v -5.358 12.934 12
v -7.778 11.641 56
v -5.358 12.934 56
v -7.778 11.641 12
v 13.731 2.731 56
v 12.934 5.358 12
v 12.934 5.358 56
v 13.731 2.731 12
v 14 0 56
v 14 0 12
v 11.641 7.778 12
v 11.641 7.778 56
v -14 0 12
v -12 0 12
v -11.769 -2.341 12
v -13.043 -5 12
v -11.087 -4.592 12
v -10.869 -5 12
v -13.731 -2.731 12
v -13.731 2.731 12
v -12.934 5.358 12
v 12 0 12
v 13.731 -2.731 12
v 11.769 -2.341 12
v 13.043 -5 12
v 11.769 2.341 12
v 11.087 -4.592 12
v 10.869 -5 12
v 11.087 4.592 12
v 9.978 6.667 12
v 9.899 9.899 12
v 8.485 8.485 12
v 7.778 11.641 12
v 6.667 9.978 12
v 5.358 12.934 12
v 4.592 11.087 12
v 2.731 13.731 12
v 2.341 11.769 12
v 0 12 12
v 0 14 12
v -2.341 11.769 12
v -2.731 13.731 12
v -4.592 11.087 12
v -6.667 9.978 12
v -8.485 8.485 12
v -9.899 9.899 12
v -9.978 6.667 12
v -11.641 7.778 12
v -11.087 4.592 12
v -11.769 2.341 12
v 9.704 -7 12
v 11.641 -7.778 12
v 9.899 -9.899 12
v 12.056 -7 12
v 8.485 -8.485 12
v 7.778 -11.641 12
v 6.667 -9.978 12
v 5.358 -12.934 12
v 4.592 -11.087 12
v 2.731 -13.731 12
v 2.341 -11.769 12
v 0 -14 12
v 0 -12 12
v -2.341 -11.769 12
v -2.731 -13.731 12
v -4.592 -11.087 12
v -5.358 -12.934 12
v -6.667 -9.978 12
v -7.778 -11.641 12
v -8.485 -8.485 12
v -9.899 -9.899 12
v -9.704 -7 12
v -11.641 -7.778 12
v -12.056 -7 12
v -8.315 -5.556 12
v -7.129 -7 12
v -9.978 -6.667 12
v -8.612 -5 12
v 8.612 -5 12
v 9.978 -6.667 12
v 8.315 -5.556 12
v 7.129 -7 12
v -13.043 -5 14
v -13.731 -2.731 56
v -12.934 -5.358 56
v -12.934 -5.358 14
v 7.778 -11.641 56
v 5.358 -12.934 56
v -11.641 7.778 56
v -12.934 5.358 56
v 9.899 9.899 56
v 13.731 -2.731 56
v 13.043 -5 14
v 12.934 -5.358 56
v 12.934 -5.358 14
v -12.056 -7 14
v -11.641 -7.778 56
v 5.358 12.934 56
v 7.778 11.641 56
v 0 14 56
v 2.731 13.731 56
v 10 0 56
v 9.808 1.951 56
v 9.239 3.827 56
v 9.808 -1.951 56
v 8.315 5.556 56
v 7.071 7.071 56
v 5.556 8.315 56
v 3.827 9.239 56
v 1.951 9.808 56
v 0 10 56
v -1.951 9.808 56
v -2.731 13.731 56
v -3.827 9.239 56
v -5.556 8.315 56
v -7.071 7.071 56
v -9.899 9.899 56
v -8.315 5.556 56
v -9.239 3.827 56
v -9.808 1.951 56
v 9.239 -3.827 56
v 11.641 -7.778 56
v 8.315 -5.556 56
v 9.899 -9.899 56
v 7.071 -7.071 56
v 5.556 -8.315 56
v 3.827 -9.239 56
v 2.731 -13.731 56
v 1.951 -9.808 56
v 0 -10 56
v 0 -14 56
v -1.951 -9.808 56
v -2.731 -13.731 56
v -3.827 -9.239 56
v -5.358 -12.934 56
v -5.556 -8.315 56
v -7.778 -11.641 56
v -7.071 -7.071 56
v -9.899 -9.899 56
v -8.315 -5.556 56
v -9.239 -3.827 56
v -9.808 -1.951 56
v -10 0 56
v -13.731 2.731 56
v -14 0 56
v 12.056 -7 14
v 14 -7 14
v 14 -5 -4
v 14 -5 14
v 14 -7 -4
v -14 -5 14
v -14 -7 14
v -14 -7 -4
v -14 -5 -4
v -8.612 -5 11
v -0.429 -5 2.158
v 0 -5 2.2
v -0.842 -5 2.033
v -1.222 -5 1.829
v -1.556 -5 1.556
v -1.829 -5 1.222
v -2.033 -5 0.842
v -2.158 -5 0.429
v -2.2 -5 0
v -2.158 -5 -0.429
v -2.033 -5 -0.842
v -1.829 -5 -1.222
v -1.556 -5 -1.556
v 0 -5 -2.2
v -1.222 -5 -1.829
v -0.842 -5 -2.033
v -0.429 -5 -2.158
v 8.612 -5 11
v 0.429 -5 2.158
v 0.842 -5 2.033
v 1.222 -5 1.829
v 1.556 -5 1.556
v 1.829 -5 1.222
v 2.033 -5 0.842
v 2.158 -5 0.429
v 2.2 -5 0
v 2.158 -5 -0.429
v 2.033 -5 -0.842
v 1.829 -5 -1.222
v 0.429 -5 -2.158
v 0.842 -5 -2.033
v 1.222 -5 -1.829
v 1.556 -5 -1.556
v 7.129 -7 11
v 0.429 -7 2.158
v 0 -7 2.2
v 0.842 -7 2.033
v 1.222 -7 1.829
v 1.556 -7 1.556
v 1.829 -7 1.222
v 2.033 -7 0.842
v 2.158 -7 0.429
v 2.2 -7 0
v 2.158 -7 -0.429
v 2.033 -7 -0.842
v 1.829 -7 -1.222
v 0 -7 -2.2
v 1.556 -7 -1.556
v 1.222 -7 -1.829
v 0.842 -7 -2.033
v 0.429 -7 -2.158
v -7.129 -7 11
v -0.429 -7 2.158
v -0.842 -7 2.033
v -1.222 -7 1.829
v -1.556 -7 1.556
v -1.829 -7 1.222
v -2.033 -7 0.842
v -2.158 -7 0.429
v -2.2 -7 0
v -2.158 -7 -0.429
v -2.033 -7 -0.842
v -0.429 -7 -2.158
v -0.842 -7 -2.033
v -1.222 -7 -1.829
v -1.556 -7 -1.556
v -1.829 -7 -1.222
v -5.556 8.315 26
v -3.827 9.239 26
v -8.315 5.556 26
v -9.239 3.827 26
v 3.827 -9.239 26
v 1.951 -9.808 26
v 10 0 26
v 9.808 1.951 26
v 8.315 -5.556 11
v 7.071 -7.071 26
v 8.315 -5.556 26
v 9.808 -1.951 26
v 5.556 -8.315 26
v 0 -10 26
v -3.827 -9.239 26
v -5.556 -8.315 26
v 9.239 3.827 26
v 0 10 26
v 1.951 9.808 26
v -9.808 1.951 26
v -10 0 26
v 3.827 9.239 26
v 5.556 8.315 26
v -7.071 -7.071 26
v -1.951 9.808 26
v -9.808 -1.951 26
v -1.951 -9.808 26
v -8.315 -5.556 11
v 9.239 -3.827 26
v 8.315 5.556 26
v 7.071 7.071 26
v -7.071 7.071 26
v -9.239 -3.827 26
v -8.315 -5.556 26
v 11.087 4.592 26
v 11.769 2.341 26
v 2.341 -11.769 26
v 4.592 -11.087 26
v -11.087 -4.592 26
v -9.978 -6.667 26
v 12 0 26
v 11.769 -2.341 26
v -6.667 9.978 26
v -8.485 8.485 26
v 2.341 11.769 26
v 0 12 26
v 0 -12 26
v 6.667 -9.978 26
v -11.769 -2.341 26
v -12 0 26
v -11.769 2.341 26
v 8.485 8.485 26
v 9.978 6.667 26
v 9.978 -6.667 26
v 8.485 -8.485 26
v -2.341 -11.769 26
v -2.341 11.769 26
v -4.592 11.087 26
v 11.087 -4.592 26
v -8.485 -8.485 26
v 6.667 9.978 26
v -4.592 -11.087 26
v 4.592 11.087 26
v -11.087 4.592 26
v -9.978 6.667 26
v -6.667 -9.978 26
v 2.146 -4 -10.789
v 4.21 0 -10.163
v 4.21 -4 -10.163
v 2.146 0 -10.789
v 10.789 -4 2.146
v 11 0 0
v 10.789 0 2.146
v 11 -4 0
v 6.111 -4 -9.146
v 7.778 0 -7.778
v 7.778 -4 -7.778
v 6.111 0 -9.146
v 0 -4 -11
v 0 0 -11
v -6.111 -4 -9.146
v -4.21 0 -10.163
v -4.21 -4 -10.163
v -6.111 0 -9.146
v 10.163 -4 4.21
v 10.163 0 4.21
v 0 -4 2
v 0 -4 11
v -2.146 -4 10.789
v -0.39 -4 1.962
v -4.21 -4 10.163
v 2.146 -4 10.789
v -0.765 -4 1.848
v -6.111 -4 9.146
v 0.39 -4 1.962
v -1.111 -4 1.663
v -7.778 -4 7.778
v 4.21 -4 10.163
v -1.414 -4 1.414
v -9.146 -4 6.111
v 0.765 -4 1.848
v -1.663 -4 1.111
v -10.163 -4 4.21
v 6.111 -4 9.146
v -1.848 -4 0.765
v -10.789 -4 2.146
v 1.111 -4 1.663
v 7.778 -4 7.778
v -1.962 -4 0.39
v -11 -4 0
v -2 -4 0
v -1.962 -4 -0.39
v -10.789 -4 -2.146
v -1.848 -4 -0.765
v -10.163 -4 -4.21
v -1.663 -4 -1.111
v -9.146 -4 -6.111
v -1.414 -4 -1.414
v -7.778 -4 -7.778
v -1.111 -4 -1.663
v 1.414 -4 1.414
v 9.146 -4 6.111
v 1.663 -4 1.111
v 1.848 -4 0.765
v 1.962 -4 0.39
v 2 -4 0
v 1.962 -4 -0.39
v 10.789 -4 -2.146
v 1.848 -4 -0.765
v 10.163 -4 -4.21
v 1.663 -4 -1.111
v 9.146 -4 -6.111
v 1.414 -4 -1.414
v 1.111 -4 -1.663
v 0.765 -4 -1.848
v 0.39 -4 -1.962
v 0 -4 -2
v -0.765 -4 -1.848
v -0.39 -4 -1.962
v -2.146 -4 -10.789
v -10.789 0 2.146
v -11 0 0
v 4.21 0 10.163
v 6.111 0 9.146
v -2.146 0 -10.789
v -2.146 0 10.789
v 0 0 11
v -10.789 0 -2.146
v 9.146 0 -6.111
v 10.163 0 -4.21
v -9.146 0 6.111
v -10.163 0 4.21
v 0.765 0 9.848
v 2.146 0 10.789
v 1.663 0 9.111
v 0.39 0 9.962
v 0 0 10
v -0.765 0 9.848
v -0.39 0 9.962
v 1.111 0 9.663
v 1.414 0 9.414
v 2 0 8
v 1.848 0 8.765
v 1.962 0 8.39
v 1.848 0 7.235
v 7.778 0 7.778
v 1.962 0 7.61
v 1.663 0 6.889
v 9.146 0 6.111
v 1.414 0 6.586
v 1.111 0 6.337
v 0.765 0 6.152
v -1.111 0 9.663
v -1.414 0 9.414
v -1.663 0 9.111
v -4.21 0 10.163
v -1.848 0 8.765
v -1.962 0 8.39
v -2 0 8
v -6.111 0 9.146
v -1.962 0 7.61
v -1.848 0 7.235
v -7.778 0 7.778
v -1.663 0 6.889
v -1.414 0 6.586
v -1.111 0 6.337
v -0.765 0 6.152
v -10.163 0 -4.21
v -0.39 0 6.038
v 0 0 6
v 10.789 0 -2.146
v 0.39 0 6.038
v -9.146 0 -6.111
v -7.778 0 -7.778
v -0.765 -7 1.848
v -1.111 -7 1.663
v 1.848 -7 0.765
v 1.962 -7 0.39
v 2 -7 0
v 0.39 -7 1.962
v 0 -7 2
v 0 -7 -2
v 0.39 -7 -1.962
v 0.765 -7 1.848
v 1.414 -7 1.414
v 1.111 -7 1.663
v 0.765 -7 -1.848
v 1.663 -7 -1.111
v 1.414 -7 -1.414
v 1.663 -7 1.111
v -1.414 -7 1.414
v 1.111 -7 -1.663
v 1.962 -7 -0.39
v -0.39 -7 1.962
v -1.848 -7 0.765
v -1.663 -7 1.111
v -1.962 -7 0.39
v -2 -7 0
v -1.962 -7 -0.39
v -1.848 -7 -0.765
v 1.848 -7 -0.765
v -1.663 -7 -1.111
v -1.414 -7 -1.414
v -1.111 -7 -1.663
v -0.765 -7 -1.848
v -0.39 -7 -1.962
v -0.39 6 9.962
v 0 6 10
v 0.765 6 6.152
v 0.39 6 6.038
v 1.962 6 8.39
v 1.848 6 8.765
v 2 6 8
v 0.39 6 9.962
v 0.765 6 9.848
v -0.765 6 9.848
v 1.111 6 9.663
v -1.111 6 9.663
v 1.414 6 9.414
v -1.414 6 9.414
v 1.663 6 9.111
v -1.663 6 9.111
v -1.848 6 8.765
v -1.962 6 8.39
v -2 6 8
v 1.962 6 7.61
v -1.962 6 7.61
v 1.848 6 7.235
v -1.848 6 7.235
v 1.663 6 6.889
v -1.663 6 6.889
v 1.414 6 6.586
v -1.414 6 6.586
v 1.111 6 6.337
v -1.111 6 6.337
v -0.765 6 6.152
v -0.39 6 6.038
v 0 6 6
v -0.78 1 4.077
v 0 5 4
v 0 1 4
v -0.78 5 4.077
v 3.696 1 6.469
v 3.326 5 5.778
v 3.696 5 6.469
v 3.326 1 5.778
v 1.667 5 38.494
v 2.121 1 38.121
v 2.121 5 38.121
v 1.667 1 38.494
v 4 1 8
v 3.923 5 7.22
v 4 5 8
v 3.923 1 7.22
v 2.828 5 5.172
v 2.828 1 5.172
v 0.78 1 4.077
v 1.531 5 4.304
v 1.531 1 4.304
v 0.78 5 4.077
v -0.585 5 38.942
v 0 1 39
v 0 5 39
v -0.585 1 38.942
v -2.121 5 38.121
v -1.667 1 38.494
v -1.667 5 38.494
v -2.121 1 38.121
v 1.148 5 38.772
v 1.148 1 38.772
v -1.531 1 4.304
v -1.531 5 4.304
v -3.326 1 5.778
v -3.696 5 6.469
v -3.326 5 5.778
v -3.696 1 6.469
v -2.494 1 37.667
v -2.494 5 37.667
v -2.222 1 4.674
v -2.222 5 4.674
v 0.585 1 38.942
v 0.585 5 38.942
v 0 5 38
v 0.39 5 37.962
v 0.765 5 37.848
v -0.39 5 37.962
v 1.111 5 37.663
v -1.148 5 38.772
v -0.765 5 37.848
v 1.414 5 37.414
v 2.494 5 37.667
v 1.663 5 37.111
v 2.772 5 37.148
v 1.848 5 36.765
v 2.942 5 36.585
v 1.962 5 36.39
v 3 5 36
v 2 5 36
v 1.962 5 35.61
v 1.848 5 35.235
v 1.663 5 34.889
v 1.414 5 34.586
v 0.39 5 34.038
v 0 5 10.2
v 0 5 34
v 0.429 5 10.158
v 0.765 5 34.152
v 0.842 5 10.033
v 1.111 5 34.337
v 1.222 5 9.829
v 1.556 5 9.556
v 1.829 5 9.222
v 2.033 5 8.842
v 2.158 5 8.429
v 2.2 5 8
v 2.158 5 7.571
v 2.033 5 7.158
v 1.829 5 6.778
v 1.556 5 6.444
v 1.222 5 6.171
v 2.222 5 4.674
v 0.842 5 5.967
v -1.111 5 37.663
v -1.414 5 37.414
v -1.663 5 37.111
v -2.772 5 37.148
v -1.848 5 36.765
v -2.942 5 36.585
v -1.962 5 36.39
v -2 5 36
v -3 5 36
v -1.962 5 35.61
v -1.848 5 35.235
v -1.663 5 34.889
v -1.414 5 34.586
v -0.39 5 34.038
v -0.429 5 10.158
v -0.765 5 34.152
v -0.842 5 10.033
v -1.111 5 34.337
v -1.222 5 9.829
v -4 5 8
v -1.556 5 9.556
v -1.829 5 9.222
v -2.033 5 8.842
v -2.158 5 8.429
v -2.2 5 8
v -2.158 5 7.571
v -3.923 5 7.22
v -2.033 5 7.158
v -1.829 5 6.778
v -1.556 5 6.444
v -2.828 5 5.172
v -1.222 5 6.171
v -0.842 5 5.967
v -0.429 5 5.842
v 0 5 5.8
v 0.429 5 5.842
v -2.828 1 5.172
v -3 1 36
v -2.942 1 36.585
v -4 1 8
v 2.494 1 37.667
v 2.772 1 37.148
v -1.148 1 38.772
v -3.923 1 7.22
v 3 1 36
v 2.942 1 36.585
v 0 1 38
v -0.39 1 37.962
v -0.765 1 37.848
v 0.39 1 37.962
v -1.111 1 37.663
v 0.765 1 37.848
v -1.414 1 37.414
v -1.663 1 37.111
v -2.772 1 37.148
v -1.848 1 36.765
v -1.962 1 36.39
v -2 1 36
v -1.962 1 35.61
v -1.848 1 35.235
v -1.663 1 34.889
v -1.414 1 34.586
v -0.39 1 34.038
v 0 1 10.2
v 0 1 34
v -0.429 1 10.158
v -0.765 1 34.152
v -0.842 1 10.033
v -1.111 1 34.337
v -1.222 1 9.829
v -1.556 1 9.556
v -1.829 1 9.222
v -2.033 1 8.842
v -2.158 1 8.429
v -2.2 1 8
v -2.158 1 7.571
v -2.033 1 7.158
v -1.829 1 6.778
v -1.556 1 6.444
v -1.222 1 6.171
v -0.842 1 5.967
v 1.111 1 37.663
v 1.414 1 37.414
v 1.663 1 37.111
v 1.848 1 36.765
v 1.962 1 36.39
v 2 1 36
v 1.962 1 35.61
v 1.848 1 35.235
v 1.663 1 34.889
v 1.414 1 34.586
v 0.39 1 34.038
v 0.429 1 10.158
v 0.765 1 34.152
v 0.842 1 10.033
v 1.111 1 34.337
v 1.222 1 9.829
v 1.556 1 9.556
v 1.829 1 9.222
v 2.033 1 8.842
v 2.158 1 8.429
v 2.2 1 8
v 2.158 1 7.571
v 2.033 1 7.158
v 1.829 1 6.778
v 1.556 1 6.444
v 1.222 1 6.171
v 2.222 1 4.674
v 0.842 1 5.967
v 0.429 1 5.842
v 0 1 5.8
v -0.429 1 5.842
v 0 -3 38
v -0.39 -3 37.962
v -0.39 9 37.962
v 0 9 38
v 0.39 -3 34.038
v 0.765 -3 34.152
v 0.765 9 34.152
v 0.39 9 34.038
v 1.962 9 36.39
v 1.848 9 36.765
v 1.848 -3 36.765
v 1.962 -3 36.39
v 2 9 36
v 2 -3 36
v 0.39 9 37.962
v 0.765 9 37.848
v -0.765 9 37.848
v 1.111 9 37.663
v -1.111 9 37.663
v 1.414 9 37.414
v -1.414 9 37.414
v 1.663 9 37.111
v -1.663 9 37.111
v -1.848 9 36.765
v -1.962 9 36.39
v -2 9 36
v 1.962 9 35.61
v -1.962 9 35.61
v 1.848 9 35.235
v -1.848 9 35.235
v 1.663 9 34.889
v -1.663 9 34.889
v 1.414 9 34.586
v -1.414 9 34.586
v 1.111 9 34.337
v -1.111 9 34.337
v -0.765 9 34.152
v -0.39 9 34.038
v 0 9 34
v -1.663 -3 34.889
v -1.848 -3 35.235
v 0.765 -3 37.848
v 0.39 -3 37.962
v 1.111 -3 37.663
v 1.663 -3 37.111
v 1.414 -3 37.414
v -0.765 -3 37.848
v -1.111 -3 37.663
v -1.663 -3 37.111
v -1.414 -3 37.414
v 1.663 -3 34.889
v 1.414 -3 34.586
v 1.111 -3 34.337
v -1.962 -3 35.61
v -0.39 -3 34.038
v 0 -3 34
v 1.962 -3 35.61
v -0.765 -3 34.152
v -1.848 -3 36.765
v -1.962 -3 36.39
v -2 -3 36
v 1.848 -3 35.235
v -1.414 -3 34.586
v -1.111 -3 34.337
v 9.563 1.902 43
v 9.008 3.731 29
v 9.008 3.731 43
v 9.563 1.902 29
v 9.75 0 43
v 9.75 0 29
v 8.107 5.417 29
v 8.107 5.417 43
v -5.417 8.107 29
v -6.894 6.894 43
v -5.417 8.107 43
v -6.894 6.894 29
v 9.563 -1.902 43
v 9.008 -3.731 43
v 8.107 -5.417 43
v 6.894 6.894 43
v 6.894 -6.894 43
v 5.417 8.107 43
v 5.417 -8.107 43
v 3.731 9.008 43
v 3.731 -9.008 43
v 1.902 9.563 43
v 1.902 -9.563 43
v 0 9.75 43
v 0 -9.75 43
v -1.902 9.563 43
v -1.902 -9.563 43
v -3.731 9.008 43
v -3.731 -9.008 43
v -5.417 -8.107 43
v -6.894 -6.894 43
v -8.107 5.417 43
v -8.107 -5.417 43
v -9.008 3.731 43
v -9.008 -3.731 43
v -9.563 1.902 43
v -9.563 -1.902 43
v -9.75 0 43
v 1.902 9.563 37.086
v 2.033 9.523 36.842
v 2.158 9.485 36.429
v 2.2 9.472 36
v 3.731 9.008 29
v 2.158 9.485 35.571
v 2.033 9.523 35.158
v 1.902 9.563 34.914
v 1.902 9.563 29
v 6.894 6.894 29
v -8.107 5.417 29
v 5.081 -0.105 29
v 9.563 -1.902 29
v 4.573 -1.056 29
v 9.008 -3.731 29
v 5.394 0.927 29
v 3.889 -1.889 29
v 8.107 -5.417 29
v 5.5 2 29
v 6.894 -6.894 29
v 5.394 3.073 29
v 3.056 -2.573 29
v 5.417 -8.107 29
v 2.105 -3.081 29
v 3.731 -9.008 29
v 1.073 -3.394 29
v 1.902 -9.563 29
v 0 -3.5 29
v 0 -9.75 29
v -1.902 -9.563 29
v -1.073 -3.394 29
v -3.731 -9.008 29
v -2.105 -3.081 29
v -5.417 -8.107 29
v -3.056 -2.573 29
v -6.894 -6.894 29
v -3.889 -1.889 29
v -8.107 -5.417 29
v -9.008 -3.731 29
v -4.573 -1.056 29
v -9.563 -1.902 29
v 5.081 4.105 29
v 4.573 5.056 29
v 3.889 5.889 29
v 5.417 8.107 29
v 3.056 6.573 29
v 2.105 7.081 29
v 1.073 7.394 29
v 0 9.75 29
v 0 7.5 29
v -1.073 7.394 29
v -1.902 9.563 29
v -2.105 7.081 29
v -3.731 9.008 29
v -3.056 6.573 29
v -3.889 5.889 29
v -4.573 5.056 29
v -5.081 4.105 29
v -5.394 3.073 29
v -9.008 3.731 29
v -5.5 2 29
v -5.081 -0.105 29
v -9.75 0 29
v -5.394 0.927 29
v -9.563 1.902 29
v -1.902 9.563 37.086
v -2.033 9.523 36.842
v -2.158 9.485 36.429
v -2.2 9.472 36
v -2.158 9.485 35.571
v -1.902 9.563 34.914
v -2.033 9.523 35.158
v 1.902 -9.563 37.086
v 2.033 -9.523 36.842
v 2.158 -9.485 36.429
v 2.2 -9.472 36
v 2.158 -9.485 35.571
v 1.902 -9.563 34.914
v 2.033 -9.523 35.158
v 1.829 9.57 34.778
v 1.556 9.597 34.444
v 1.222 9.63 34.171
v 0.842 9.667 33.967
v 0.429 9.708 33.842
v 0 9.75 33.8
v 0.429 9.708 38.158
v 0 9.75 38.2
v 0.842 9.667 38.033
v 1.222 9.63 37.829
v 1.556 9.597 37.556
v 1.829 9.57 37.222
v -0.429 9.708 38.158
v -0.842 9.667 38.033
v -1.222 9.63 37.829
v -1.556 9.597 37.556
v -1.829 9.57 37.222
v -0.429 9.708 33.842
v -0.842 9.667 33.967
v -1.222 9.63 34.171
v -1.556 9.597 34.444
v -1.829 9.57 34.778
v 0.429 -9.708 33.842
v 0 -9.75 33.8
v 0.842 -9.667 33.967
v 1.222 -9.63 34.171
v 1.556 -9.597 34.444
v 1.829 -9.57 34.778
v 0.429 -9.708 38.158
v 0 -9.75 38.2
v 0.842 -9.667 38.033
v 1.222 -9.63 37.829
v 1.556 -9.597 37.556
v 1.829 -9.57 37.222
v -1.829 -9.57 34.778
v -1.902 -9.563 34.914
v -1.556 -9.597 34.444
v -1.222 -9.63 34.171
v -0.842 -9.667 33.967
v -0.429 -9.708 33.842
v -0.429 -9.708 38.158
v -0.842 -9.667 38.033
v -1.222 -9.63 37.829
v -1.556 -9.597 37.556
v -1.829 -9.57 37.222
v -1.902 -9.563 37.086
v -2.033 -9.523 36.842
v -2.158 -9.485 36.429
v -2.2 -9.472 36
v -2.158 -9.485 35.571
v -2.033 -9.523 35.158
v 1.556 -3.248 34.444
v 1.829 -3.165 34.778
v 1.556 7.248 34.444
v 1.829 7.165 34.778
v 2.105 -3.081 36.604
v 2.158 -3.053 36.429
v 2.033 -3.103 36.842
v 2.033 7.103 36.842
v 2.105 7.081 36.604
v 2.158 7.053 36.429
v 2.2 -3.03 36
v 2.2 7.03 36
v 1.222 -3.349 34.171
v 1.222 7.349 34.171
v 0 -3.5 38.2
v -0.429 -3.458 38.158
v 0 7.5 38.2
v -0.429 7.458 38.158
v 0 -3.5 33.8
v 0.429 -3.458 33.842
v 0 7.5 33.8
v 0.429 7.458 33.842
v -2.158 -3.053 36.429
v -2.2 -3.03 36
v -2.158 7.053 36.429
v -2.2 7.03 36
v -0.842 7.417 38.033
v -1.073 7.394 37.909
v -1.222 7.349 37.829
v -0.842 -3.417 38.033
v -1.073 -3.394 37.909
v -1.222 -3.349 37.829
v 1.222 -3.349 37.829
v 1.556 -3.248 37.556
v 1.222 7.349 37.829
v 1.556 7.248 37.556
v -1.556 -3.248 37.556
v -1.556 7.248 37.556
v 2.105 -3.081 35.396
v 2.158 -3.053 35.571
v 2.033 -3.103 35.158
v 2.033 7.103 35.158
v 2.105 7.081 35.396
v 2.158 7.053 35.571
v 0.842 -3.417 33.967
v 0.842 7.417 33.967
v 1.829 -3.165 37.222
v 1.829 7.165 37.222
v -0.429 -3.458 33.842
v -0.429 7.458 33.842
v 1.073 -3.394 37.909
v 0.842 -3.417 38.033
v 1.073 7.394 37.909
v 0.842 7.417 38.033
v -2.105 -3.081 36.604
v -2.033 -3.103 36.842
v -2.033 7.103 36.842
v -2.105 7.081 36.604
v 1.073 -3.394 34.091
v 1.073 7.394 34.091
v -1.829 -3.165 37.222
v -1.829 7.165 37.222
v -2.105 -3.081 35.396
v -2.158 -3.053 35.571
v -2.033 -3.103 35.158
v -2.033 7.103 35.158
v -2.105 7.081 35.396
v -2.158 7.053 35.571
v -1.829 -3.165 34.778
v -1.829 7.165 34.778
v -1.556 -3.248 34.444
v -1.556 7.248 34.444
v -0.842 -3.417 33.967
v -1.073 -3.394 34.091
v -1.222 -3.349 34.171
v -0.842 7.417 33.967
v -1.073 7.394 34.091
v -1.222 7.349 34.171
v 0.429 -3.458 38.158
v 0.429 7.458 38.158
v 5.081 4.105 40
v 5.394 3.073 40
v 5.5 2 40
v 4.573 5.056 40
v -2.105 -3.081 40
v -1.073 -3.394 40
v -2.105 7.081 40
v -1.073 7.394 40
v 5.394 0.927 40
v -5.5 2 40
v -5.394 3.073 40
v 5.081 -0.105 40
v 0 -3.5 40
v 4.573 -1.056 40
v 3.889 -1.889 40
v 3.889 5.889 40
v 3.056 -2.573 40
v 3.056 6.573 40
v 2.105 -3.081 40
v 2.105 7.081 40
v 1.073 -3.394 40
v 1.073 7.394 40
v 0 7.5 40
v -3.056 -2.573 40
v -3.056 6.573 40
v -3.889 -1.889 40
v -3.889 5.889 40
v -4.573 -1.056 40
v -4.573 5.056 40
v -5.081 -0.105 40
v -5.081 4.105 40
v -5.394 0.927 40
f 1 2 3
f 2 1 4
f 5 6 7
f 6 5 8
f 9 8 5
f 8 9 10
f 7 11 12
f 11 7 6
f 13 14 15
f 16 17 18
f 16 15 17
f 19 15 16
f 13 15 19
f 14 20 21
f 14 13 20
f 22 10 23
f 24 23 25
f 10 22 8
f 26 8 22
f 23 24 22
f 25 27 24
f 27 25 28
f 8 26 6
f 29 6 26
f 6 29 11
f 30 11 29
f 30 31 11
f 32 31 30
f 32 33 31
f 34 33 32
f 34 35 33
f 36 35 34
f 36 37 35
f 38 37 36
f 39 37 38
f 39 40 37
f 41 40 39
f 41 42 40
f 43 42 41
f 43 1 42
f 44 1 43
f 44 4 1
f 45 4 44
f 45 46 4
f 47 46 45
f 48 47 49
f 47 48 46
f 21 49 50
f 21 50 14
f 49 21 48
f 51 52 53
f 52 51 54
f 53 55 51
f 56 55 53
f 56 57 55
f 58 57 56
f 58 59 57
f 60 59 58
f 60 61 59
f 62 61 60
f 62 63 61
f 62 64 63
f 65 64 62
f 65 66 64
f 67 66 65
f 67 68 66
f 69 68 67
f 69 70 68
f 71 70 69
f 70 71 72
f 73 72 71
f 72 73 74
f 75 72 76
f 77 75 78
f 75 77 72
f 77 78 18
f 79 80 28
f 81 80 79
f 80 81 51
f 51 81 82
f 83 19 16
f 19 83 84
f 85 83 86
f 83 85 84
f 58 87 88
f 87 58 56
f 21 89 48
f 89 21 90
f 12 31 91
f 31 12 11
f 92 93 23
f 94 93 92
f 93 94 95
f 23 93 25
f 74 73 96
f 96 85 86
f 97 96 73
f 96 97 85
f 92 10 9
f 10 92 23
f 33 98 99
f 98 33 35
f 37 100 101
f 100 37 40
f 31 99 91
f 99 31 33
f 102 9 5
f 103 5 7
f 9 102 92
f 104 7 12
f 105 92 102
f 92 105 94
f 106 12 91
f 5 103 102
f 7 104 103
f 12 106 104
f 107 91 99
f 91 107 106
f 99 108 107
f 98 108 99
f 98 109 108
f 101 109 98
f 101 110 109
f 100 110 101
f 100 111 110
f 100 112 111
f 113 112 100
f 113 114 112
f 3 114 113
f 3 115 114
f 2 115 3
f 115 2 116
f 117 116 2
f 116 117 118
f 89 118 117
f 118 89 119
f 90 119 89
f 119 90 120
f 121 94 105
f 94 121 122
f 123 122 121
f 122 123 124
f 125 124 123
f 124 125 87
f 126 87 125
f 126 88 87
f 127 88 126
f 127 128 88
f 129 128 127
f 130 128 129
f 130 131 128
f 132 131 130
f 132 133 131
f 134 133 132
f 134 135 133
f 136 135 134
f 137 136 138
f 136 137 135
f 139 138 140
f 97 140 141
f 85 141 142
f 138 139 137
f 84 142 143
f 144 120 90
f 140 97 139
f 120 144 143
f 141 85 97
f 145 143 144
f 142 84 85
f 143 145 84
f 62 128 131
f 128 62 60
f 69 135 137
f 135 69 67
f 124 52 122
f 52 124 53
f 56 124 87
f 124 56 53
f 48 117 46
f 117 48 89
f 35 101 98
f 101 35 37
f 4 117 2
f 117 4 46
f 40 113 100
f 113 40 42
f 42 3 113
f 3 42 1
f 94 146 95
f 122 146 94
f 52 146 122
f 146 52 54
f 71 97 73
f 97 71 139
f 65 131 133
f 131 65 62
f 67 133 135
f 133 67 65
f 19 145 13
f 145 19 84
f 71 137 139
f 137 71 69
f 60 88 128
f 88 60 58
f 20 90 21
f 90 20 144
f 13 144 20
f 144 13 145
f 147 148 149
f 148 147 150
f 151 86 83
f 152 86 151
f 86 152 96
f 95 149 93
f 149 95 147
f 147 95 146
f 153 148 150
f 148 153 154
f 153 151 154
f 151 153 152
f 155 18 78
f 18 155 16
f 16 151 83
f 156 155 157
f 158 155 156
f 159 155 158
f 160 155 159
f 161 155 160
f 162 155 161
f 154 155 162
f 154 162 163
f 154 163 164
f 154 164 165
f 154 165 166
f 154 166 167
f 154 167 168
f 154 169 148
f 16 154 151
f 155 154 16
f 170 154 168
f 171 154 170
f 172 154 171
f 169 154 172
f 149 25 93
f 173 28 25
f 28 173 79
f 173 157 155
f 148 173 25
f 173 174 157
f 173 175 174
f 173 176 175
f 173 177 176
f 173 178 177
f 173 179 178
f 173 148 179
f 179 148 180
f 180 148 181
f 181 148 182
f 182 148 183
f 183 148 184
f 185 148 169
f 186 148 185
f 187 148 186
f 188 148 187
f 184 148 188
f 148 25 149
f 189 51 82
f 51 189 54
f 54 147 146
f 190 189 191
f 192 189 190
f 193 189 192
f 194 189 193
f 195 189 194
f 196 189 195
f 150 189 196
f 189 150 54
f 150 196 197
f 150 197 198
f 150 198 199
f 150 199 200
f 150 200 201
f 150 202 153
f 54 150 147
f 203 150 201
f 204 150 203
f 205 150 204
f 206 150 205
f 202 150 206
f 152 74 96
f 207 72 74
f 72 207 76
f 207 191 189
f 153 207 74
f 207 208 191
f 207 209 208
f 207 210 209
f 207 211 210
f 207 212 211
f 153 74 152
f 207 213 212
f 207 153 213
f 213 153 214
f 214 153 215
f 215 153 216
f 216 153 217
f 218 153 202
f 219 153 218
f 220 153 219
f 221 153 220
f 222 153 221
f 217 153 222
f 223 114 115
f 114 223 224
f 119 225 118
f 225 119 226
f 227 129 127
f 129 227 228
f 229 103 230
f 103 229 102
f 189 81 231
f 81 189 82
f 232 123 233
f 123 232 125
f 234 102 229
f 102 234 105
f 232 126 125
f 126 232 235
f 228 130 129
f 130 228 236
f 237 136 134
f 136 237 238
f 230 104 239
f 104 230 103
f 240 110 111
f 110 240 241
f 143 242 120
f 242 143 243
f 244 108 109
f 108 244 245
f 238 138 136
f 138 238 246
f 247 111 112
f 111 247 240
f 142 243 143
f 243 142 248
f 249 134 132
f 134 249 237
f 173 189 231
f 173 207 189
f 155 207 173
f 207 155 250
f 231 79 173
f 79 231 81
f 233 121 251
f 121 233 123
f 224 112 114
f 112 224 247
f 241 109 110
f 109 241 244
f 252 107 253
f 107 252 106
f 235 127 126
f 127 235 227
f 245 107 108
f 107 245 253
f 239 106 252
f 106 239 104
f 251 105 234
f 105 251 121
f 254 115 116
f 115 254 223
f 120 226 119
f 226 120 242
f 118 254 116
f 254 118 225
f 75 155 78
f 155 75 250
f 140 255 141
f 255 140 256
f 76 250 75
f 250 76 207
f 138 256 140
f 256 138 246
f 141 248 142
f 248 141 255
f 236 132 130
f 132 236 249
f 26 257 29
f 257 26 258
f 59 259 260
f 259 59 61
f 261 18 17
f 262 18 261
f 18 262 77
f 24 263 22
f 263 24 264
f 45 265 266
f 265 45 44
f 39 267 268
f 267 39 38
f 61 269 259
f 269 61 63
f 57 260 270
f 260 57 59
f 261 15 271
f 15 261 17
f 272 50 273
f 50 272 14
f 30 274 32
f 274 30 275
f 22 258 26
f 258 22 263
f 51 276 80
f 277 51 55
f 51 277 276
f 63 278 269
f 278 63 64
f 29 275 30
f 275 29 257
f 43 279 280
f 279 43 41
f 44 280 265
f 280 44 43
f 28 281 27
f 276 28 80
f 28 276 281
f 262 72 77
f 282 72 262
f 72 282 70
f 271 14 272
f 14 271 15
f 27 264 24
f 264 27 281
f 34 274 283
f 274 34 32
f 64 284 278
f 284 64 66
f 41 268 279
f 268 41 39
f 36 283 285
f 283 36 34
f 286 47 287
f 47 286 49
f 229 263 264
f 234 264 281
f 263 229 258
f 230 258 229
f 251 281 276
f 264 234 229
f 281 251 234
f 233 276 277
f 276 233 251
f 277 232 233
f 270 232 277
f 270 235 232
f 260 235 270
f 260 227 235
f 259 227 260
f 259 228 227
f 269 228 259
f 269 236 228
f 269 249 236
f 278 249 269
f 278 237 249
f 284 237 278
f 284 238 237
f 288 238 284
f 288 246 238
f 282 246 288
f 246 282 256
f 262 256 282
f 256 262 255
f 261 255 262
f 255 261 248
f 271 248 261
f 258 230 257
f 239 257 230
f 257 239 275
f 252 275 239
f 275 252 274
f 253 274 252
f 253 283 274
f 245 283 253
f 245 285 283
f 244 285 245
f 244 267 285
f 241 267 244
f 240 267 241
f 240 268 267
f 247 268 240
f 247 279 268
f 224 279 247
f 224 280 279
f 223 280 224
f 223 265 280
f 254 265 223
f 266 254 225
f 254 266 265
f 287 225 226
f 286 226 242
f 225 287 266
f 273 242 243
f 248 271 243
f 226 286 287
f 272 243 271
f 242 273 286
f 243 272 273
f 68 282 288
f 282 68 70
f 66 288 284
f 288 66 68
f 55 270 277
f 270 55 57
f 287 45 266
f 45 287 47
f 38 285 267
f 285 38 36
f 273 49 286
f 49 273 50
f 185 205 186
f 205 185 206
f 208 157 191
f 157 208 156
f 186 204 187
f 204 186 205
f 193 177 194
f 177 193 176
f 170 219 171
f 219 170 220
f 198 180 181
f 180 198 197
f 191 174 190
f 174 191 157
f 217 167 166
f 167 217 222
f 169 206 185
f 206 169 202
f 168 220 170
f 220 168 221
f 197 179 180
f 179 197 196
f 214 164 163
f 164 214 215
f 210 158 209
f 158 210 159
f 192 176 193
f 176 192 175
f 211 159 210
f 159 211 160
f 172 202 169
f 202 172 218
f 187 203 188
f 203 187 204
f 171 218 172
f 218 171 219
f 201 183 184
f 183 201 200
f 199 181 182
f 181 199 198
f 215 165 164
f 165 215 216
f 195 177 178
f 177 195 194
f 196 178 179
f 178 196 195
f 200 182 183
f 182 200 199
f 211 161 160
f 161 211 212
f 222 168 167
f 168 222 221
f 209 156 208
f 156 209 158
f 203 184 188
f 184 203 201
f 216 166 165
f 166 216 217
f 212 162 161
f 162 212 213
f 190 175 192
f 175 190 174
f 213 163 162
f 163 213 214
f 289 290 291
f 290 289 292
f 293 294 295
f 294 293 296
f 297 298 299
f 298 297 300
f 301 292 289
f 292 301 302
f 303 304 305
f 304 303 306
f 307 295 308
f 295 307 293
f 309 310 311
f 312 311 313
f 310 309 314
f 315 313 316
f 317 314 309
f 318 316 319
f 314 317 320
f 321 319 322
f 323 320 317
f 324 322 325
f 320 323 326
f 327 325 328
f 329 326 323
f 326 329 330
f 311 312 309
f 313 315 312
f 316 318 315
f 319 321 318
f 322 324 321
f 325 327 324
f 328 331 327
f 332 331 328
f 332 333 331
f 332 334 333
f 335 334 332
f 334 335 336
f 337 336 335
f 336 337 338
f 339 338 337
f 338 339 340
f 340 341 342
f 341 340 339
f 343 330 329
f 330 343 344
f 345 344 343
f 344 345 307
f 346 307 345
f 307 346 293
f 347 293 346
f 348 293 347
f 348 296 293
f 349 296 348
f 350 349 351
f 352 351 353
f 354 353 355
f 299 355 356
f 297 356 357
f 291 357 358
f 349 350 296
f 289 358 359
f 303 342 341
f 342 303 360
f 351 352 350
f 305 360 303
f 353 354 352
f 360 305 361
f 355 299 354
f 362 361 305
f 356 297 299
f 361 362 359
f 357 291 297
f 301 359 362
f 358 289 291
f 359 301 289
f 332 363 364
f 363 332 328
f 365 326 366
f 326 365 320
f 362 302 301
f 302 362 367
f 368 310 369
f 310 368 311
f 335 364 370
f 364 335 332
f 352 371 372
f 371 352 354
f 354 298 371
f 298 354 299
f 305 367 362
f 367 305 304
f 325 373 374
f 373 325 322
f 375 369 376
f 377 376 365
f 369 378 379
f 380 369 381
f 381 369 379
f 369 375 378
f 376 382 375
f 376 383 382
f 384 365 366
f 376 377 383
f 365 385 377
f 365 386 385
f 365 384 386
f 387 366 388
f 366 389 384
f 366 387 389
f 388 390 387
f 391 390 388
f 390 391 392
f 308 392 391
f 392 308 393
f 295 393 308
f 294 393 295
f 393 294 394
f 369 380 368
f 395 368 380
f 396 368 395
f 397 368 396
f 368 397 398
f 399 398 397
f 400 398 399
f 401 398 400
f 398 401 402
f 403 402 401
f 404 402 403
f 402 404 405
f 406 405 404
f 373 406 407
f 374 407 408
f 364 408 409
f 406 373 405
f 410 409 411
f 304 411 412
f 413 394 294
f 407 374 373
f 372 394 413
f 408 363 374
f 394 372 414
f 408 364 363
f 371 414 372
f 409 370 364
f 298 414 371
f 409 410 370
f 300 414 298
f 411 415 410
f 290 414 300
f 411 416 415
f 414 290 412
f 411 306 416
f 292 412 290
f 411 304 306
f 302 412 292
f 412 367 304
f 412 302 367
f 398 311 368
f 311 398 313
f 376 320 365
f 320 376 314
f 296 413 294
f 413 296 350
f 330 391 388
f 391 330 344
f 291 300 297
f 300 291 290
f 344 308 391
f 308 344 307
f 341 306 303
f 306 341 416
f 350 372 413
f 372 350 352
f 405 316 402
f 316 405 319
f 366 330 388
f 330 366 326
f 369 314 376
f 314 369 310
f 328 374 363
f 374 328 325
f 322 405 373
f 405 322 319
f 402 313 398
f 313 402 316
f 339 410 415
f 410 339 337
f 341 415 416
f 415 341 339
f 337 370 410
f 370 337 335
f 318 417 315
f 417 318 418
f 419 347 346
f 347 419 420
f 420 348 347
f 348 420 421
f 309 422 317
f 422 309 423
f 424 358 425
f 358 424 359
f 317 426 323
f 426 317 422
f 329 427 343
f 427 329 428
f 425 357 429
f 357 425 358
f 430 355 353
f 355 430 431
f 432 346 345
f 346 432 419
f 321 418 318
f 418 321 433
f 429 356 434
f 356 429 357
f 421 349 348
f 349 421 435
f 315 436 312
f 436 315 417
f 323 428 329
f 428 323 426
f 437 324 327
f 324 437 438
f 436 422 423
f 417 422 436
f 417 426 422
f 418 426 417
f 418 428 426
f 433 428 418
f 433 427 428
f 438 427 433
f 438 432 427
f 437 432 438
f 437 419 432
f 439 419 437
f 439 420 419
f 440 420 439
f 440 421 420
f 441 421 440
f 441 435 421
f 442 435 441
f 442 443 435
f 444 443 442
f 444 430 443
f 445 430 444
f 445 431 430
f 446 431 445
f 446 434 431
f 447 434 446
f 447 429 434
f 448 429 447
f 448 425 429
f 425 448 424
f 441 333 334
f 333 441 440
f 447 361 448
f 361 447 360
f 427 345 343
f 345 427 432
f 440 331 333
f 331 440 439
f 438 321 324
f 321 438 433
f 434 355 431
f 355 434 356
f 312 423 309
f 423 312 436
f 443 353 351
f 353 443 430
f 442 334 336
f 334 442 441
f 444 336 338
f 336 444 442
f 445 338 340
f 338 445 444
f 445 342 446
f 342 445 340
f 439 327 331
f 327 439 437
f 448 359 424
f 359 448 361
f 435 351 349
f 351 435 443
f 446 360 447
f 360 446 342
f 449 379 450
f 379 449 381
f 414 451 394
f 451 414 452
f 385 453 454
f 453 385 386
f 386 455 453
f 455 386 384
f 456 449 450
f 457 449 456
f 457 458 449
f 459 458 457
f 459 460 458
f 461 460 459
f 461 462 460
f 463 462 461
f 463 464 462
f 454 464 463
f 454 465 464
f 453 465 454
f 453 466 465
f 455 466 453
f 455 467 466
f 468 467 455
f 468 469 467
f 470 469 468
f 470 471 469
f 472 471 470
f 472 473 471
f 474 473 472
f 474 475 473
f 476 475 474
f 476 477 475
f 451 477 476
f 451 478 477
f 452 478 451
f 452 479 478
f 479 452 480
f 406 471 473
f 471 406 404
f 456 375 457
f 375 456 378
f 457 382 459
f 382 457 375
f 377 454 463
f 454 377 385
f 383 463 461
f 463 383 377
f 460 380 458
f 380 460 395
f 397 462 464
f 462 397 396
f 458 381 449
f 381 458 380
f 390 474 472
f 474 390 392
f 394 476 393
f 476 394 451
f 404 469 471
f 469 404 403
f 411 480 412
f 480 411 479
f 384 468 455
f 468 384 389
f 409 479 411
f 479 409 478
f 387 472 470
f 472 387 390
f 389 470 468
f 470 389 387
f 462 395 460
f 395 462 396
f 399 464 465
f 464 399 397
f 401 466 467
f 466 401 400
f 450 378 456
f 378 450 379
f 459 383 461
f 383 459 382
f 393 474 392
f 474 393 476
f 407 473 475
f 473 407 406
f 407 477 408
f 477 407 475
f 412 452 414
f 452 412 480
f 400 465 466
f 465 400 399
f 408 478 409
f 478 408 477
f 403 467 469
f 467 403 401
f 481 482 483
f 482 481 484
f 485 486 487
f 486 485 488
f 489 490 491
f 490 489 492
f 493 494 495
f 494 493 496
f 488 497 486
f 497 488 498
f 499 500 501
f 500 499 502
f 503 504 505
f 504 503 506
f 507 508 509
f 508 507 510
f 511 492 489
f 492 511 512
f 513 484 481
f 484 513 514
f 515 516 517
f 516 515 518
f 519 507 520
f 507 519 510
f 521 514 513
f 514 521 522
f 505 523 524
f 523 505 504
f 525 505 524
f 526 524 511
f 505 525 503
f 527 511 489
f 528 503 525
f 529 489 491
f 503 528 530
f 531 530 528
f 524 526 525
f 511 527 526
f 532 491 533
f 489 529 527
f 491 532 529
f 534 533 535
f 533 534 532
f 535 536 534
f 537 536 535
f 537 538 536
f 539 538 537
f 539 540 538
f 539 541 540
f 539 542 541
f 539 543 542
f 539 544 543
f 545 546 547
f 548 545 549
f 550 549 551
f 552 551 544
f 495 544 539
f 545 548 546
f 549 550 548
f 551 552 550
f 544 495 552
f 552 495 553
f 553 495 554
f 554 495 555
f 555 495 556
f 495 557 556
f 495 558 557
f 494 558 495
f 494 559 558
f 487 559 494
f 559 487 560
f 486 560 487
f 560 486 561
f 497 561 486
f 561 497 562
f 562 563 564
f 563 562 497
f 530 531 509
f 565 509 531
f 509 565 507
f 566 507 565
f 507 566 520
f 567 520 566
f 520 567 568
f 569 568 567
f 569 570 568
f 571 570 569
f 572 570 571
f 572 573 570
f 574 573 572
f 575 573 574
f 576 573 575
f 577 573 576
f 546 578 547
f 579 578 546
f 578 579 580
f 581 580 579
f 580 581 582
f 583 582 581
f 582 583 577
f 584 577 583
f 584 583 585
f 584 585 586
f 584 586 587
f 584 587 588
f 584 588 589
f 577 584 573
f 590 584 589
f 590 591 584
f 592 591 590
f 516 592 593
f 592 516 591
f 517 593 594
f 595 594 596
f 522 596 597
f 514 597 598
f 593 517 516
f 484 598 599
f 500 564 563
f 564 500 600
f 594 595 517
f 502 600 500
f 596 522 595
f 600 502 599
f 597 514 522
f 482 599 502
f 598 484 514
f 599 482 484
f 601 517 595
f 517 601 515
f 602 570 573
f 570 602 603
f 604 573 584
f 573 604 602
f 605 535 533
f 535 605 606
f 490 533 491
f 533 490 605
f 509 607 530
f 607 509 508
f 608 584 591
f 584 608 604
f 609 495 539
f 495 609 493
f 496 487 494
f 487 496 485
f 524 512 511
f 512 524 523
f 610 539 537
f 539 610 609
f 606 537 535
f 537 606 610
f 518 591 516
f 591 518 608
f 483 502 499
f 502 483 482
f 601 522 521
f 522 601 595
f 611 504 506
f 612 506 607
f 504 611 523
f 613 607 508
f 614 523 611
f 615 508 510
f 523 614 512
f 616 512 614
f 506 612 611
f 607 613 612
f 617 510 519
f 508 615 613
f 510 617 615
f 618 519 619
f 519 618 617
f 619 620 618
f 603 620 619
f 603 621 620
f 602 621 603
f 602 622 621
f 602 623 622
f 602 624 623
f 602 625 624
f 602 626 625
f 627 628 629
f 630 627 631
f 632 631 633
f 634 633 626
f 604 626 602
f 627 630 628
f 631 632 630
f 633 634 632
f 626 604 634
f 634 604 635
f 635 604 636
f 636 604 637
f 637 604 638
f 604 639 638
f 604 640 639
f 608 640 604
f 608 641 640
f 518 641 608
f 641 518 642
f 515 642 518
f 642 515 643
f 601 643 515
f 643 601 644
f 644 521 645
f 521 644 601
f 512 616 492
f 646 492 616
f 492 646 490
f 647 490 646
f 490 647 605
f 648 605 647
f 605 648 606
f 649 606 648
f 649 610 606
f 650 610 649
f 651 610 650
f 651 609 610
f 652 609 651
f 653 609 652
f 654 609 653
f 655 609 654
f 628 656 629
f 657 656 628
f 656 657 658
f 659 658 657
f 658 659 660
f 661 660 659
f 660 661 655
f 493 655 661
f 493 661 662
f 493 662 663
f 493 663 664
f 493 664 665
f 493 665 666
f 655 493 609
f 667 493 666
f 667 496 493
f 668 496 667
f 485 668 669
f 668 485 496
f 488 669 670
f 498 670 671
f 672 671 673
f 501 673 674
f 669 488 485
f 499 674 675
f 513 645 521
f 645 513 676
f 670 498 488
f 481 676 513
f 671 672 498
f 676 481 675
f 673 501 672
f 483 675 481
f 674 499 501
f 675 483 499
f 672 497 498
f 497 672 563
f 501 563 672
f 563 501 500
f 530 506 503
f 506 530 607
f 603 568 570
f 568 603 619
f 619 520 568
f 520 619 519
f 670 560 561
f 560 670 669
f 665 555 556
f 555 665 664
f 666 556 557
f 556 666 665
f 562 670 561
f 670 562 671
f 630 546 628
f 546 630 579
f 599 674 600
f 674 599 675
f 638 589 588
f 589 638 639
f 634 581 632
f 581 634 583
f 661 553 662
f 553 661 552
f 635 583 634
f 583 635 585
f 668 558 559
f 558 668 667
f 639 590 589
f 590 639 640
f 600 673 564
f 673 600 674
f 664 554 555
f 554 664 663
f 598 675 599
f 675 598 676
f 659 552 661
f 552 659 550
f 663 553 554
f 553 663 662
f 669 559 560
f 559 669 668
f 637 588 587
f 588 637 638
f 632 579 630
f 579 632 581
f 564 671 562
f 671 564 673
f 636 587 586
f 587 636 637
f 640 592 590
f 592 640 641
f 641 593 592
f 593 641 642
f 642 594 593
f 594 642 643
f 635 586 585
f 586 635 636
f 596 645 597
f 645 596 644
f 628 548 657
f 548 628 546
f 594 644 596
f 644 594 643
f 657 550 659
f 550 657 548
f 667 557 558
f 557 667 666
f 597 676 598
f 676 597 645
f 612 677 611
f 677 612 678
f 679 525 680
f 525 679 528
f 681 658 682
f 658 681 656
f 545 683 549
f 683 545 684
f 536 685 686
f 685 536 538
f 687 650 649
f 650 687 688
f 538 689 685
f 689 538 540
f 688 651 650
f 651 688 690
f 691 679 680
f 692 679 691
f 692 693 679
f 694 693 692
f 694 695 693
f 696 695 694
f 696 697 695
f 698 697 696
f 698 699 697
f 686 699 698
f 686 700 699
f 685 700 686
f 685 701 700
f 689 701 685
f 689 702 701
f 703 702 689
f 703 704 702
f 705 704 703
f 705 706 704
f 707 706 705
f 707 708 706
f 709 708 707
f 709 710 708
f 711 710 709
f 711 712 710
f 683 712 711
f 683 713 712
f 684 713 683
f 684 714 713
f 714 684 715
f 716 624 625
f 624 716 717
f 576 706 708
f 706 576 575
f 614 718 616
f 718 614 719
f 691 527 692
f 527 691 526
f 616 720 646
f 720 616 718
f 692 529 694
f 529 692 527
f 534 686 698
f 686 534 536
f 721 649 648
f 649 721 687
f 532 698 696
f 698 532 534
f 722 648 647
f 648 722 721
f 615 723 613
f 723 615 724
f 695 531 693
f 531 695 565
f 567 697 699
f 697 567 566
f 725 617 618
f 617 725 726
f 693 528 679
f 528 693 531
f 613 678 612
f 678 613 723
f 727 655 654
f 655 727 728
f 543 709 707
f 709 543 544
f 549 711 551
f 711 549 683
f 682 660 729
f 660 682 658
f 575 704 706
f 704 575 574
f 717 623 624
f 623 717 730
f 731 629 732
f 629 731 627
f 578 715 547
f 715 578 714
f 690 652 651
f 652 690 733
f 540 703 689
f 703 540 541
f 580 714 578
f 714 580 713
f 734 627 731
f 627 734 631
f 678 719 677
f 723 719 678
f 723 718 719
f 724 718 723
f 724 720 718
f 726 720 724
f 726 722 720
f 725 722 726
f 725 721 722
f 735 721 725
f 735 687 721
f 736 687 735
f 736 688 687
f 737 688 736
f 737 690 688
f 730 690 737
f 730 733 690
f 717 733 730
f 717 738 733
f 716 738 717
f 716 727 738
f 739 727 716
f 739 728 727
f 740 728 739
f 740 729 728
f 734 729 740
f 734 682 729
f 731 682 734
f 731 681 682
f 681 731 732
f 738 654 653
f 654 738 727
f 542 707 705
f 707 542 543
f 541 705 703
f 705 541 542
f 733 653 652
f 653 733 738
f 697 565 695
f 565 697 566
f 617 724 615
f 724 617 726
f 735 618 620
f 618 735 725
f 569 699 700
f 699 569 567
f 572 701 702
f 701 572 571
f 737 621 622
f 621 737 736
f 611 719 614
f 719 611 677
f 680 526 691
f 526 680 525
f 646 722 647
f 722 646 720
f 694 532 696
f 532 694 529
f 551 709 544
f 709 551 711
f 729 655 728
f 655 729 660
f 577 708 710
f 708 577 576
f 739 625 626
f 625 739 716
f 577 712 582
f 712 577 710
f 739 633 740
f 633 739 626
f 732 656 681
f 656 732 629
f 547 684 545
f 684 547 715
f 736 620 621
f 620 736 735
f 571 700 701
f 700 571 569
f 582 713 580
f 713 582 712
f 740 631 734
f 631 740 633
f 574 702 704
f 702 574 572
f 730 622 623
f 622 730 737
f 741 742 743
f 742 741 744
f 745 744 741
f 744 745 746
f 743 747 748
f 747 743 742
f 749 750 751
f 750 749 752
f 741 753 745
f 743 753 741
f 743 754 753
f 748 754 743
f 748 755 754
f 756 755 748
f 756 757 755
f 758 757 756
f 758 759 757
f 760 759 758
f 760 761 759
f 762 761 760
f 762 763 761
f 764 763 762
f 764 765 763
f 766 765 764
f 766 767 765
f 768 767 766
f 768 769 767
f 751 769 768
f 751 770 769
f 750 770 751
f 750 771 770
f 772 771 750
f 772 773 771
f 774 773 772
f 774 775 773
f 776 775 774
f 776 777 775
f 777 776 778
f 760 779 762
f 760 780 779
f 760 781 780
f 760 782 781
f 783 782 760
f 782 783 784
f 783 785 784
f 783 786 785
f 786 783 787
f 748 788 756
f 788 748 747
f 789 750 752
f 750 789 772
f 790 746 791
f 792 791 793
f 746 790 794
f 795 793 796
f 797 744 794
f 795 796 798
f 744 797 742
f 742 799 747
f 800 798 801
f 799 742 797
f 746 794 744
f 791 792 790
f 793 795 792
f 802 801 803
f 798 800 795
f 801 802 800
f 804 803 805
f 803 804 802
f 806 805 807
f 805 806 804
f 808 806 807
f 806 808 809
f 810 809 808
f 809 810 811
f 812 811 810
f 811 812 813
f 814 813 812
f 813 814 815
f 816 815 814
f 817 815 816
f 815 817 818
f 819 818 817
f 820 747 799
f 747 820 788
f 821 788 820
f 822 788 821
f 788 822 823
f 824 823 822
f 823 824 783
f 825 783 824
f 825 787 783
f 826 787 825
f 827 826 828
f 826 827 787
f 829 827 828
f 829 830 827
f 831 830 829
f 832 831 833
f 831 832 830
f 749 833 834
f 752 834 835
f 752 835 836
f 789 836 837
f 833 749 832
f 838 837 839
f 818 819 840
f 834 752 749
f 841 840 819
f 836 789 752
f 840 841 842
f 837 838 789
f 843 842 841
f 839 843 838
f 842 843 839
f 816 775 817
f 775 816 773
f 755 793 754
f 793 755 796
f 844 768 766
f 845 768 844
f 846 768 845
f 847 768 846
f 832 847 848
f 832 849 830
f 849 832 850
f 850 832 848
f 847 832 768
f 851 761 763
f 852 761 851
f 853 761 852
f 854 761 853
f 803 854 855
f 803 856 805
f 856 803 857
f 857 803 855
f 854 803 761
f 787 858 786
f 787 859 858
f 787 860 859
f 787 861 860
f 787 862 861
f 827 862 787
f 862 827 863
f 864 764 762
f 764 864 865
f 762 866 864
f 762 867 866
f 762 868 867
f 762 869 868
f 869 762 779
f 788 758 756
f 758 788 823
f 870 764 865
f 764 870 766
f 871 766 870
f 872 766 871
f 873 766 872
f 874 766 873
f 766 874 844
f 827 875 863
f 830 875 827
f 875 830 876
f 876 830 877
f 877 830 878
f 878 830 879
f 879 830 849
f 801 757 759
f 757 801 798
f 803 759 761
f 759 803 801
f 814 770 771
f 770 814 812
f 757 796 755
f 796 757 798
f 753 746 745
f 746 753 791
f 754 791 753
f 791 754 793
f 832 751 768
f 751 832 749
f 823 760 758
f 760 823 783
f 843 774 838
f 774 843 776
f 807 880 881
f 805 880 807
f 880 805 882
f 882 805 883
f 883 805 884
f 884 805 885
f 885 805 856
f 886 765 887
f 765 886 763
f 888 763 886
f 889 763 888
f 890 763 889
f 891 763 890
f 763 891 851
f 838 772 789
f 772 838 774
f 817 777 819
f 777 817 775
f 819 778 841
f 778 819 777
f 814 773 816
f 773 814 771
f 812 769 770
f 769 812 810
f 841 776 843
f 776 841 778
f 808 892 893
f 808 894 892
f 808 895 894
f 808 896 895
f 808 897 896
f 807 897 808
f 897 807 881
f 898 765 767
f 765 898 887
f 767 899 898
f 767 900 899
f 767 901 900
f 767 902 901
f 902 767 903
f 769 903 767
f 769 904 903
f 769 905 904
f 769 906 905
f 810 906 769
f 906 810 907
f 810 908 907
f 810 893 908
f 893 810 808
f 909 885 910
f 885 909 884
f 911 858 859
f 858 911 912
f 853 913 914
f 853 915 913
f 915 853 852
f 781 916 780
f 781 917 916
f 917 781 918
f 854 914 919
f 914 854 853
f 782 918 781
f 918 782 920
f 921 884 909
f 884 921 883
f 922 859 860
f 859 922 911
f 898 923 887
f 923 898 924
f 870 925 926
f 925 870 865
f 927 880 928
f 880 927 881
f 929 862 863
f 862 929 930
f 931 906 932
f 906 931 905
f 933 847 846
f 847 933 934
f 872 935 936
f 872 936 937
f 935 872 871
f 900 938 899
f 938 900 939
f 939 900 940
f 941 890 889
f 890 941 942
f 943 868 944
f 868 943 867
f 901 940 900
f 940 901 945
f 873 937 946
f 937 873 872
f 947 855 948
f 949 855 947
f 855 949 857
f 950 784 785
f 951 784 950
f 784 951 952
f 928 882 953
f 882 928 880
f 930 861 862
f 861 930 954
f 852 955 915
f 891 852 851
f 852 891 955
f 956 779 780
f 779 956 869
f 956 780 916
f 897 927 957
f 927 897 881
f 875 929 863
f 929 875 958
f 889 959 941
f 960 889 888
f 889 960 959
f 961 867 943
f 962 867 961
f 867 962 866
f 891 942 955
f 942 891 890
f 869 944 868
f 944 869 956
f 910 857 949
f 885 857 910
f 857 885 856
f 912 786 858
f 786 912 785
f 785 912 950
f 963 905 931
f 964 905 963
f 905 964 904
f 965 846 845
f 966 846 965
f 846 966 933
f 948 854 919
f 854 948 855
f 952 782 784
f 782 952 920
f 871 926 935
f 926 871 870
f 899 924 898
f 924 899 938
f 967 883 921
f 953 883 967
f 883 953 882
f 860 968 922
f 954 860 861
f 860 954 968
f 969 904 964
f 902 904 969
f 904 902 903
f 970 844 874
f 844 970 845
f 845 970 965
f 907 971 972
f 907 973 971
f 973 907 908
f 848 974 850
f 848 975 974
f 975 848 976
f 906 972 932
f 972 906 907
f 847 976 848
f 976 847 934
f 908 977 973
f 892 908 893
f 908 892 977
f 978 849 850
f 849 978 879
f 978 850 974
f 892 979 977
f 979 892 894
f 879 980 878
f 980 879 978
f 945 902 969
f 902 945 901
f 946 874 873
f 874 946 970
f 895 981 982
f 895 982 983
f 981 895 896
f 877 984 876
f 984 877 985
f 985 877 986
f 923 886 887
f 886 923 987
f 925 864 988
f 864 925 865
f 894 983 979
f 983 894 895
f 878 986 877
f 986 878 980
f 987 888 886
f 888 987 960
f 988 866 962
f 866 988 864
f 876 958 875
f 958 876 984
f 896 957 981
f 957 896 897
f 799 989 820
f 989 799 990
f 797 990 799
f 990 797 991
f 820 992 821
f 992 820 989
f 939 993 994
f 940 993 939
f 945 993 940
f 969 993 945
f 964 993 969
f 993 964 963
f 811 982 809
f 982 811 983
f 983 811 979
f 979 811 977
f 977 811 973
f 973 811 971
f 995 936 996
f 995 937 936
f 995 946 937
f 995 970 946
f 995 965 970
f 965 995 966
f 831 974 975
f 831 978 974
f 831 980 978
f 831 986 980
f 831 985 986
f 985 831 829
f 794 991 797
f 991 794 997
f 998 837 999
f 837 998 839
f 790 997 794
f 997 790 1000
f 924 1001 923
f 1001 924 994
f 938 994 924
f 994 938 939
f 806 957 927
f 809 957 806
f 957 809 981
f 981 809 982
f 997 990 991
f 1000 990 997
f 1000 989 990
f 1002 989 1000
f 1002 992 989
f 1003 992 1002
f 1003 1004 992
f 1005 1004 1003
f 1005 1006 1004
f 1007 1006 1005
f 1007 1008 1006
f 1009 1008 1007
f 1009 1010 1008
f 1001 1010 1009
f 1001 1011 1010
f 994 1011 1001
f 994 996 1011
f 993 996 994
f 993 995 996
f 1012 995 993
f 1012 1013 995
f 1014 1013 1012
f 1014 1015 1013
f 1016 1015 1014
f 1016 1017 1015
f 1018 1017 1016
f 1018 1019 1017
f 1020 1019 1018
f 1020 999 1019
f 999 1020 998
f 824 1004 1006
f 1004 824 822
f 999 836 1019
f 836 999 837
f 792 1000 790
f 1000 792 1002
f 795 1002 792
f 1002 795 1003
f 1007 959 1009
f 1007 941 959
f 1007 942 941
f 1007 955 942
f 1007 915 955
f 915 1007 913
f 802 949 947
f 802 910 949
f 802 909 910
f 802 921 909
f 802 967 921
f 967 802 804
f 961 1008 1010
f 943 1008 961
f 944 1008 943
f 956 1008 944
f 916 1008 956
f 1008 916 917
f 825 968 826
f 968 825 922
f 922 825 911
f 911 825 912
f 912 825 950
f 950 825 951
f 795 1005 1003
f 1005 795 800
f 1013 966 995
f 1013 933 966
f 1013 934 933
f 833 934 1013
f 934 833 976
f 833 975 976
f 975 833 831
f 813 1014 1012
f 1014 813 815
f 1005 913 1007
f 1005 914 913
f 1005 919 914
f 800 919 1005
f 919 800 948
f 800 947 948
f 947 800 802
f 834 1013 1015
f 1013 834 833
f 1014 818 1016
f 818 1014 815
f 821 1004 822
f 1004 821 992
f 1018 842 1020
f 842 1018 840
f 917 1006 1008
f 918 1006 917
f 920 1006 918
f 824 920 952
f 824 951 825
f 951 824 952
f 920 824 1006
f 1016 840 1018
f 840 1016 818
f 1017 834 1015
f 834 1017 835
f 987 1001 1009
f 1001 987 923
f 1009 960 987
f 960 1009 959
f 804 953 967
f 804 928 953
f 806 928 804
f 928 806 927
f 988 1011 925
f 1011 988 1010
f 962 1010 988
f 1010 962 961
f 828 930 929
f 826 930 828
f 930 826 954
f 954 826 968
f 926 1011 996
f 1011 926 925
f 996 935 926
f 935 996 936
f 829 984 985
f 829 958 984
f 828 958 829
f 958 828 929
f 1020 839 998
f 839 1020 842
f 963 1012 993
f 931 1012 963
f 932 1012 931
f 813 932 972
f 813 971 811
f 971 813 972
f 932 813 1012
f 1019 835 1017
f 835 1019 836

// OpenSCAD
// Original piston-in-cylinder slider-crank fixture with an embedded declaration.
// The declaration is a proposal; measurements come from the rendered source.
/* AGENTSCAD_ASSEMBLY_V1
{"schemaVersion":1,"units":"mm","coordinateSystem":"right-handed","parts":[{"id":"frame","name":"Frame","selector":"frame","source":"generated","material":null},{"id":"crank","name":"Crank","selector":"crank","source":"generated","material":null},{"id":"rod","name":"Rod","selector":"rod","source":"generated","material":null},{"id":"slider","name":"Piston","selector":"slider","source":"generated","material":null}],"instances":[{"id":"frame1","partId":"frame","subassemblyId":null,"transform":[1,0,0,0,0,1,0,0,0,0,1,0,0,0,0,1]},{"id":"crank1","partId":"crank","subassemblyId":null,"transform":[1,0,0,0,0,1,0,0,0,0,1,0,0,0,0,1]},{"id":"rod1","partId":"rod","subassemblyId":null,"transform":[1,0,0,0,0,1,0,0,0,0,1,8,0,0,0,1]},{"id":"slider1","partId":"slider","subassemblyId":null,"transform":[1,0,0,0,0,1,0,0,0,0,1,36,0,0,0,1]}],"subassemblies":[],"connections":[{"id":"crank_axis","type":"revolute","a":"frame1","b":"crank1","frameA":{"origin":[0,0,0],"direction":[0,1,0]},"frameB":{"origin":[0,0,0],"direction":[0,1,0]},"range":{"min":-45,"max":45,"unit":"deg"},"pitchMm":null,"ratio":null,"boreInstanceId":"frame1","fitStationsMm":[-6.5,-6,-5.5],"allowedContact":[]},{"id":"crank_pin","type":"revolute","a":"crank1","b":"rod1","frameA":{"origin":[0,0,8],"direction":[0,1,0]},"frameB":{"origin":[0,3,0],"direction":[0,1,0]},"range":null,"pitchMm":null,"ratio":null,"boreInstanceId":"rod1","fitStationsMm":[2,3,4],"allowedContact":[]},{"id":"wrist","type":"revolute","a":"rod1","b":"slider1","frameA":{"origin":[0,0,28],"direction":[0,1,0]},"frameB":{"origin":[0,0,0],"direction":[0,1,0]},"range":null,"pitchMm":null,"ratio":null,"boreInstanceId":"slider1","fitStationsMm":[8,8.4,8.8],"allowedContact":[]},{"id":"slide","type":"prismatic","a":"slider1","b":"frame1","frameA":{"origin":[0,0,0],"direction":[0,0,1]},"frameB":{"origin":[0,0,36],"direction":[0,0,1]},"range":null,"pitchMm":null,"ratio":null,"boreInstanceId":"frame1","fitStationsMm":[5,6],"allowedContact":[]}],"groundedInstanceId":"frame1","motions":[{"id":"crank_motion","inputConnectionId":"crank_axis","range":{"min":-45,"max":45,"unit":"deg"},"sourceInput":{"parameter":"crank_angle","poseSelectors":{"frame1":"frame","crank1":"crank_pose","rod1":"rod_pose","slider1":"slider_pose"}}}],"operations":[],"manufacturing":null,"assumptions":["Original piston-in-cylinder slider-crank declaration; measurements cover only listed stations."],"unknowns":[]}
END_AGENTSCAD_ASSEMBLY */
$fn = 32;
agentscad_pose = false;
agentscad_part = "all";
crank_angle = 0;

crank_radius = 8;
rod_length = 28;
tube_outer = 14;
tube_bore = 10;
tube_start = 12;
tube_end = 56;
piston_length = 14;
piston_radius = 9.75;

crank_pin_x = crank_radius * sin(crank_angle);
crank_pin_z = crank_radius * cos(crank_angle);
rod_alpha = -asin(crank_radius * sin(crank_angle) / rod_length);
wrist_z = crank_radius * cos(crank_angle) + rod_length * cos(rod_alpha);

module frame_part() {
  difference() {
    union() {
      translate([0, 0, (tube_start + tube_end) / 2])
        cylinder(h = tube_end - tube_start, r = tube_outer, center = true);
      translate([0, -6, 5]) cube([28, 2, 18], center = true);
      translate([0, 0, 19]) cylinder(h = 14, r = 12, center = true);
    }
    translate([0, 0, (tube_start + tube_end) / 2])
      cylinder(h = tube_end - tube_start + 2, r = tube_bore, center = true);
    translate([0, 0, 19]) cylinder(h = 14, r = 12, center = true);
    translate([0, -6, 0]) rotate([90, 0, 0]) cylinder(h = 4, r = 2.2, center = true);
  }
}

module crank_part() {
  union() {
    translate([0, -2, 0]) rotate([90, 0, 0]) cylinder(h = 4, r = 11, center = true);
    translate([0, -3.5, 0]) rotate([90, 0, 0]) cylinder(h = 7, r = 2, center = true);
    translate([0, 1, crank_radius]) rotate([90, 0, 0]) cylinder(h = 10, r = 2, center = true);
  }
}

module rod_part() {
  difference() {
    hull() {
      translate([0, 3, 0]) rotate([90, 0, 0]) cylinder(h = 4, r = 4, center = true);
      translate([0, 3, rod_length]) rotate([90, 0, 0]) cylinder(h = 4, r = 3, center = true);
    }
    translate([0, 3, 0]) rotate([90, 0, 0]) cylinder(h = 6, r = 2.2, center = true);
  }
  translate([0, 3, rod_length]) rotate([90, 0, 0]) cylinder(h = 12, r = 2, center = true);
}

module slider_part() {
  difference() {
    cylinder(h = piston_length, r = piston_radius, center = true);
    rotate([90, 0, 0]) cylinder(h = 20, r = 2.2, center = true);
    // Fork slot admits the connecting rod on the crank side while the wrist
    // pin hole stays a closed cylindrical bore.
    translate([0, 2, -2]) cylinder(h = 12, r = 5.5, center = true);
  }
}

module posed_assembly() {
  frame_part();
  rotate([0, crank_angle, 0]) crank_part();
  translate([crank_pin_x, 0, crank_pin_z]) rotate([0, rod_alpha, 0]) rod_part();
  translate([0, 0, wrist_z]) slider_part();
}

module generated_part() {
  if (agentscad_pose) {
    if (agentscad_part == "frame") {
      frame_part();
    } else if (agentscad_part == "crank_pose") {
      rotate([0, crank_angle, 0]) crank_part();
    } else if (agentscad_part == "rod_pose") {
      translate([crank_pin_x, 0, crank_pin_z]) rotate([0, rod_alpha, 0]) rod_part();
    } else if (agentscad_part == "slider_pose") {
      translate([0, 0, wrist_z]) slider_part();
    } else {
      posed_assembly();
    }
  } else {
    if (agentscad_part == "frame") {
      frame_part();
    } else if (agentscad_part == "crank") {
      crank_part();
    } else if (agentscad_part == "rod") {
      rod_part();
    } else if (agentscad_part == "slider") {
      slider_part();
    } else {
      posed_assembly();
    }
  }
}

generated_part();
